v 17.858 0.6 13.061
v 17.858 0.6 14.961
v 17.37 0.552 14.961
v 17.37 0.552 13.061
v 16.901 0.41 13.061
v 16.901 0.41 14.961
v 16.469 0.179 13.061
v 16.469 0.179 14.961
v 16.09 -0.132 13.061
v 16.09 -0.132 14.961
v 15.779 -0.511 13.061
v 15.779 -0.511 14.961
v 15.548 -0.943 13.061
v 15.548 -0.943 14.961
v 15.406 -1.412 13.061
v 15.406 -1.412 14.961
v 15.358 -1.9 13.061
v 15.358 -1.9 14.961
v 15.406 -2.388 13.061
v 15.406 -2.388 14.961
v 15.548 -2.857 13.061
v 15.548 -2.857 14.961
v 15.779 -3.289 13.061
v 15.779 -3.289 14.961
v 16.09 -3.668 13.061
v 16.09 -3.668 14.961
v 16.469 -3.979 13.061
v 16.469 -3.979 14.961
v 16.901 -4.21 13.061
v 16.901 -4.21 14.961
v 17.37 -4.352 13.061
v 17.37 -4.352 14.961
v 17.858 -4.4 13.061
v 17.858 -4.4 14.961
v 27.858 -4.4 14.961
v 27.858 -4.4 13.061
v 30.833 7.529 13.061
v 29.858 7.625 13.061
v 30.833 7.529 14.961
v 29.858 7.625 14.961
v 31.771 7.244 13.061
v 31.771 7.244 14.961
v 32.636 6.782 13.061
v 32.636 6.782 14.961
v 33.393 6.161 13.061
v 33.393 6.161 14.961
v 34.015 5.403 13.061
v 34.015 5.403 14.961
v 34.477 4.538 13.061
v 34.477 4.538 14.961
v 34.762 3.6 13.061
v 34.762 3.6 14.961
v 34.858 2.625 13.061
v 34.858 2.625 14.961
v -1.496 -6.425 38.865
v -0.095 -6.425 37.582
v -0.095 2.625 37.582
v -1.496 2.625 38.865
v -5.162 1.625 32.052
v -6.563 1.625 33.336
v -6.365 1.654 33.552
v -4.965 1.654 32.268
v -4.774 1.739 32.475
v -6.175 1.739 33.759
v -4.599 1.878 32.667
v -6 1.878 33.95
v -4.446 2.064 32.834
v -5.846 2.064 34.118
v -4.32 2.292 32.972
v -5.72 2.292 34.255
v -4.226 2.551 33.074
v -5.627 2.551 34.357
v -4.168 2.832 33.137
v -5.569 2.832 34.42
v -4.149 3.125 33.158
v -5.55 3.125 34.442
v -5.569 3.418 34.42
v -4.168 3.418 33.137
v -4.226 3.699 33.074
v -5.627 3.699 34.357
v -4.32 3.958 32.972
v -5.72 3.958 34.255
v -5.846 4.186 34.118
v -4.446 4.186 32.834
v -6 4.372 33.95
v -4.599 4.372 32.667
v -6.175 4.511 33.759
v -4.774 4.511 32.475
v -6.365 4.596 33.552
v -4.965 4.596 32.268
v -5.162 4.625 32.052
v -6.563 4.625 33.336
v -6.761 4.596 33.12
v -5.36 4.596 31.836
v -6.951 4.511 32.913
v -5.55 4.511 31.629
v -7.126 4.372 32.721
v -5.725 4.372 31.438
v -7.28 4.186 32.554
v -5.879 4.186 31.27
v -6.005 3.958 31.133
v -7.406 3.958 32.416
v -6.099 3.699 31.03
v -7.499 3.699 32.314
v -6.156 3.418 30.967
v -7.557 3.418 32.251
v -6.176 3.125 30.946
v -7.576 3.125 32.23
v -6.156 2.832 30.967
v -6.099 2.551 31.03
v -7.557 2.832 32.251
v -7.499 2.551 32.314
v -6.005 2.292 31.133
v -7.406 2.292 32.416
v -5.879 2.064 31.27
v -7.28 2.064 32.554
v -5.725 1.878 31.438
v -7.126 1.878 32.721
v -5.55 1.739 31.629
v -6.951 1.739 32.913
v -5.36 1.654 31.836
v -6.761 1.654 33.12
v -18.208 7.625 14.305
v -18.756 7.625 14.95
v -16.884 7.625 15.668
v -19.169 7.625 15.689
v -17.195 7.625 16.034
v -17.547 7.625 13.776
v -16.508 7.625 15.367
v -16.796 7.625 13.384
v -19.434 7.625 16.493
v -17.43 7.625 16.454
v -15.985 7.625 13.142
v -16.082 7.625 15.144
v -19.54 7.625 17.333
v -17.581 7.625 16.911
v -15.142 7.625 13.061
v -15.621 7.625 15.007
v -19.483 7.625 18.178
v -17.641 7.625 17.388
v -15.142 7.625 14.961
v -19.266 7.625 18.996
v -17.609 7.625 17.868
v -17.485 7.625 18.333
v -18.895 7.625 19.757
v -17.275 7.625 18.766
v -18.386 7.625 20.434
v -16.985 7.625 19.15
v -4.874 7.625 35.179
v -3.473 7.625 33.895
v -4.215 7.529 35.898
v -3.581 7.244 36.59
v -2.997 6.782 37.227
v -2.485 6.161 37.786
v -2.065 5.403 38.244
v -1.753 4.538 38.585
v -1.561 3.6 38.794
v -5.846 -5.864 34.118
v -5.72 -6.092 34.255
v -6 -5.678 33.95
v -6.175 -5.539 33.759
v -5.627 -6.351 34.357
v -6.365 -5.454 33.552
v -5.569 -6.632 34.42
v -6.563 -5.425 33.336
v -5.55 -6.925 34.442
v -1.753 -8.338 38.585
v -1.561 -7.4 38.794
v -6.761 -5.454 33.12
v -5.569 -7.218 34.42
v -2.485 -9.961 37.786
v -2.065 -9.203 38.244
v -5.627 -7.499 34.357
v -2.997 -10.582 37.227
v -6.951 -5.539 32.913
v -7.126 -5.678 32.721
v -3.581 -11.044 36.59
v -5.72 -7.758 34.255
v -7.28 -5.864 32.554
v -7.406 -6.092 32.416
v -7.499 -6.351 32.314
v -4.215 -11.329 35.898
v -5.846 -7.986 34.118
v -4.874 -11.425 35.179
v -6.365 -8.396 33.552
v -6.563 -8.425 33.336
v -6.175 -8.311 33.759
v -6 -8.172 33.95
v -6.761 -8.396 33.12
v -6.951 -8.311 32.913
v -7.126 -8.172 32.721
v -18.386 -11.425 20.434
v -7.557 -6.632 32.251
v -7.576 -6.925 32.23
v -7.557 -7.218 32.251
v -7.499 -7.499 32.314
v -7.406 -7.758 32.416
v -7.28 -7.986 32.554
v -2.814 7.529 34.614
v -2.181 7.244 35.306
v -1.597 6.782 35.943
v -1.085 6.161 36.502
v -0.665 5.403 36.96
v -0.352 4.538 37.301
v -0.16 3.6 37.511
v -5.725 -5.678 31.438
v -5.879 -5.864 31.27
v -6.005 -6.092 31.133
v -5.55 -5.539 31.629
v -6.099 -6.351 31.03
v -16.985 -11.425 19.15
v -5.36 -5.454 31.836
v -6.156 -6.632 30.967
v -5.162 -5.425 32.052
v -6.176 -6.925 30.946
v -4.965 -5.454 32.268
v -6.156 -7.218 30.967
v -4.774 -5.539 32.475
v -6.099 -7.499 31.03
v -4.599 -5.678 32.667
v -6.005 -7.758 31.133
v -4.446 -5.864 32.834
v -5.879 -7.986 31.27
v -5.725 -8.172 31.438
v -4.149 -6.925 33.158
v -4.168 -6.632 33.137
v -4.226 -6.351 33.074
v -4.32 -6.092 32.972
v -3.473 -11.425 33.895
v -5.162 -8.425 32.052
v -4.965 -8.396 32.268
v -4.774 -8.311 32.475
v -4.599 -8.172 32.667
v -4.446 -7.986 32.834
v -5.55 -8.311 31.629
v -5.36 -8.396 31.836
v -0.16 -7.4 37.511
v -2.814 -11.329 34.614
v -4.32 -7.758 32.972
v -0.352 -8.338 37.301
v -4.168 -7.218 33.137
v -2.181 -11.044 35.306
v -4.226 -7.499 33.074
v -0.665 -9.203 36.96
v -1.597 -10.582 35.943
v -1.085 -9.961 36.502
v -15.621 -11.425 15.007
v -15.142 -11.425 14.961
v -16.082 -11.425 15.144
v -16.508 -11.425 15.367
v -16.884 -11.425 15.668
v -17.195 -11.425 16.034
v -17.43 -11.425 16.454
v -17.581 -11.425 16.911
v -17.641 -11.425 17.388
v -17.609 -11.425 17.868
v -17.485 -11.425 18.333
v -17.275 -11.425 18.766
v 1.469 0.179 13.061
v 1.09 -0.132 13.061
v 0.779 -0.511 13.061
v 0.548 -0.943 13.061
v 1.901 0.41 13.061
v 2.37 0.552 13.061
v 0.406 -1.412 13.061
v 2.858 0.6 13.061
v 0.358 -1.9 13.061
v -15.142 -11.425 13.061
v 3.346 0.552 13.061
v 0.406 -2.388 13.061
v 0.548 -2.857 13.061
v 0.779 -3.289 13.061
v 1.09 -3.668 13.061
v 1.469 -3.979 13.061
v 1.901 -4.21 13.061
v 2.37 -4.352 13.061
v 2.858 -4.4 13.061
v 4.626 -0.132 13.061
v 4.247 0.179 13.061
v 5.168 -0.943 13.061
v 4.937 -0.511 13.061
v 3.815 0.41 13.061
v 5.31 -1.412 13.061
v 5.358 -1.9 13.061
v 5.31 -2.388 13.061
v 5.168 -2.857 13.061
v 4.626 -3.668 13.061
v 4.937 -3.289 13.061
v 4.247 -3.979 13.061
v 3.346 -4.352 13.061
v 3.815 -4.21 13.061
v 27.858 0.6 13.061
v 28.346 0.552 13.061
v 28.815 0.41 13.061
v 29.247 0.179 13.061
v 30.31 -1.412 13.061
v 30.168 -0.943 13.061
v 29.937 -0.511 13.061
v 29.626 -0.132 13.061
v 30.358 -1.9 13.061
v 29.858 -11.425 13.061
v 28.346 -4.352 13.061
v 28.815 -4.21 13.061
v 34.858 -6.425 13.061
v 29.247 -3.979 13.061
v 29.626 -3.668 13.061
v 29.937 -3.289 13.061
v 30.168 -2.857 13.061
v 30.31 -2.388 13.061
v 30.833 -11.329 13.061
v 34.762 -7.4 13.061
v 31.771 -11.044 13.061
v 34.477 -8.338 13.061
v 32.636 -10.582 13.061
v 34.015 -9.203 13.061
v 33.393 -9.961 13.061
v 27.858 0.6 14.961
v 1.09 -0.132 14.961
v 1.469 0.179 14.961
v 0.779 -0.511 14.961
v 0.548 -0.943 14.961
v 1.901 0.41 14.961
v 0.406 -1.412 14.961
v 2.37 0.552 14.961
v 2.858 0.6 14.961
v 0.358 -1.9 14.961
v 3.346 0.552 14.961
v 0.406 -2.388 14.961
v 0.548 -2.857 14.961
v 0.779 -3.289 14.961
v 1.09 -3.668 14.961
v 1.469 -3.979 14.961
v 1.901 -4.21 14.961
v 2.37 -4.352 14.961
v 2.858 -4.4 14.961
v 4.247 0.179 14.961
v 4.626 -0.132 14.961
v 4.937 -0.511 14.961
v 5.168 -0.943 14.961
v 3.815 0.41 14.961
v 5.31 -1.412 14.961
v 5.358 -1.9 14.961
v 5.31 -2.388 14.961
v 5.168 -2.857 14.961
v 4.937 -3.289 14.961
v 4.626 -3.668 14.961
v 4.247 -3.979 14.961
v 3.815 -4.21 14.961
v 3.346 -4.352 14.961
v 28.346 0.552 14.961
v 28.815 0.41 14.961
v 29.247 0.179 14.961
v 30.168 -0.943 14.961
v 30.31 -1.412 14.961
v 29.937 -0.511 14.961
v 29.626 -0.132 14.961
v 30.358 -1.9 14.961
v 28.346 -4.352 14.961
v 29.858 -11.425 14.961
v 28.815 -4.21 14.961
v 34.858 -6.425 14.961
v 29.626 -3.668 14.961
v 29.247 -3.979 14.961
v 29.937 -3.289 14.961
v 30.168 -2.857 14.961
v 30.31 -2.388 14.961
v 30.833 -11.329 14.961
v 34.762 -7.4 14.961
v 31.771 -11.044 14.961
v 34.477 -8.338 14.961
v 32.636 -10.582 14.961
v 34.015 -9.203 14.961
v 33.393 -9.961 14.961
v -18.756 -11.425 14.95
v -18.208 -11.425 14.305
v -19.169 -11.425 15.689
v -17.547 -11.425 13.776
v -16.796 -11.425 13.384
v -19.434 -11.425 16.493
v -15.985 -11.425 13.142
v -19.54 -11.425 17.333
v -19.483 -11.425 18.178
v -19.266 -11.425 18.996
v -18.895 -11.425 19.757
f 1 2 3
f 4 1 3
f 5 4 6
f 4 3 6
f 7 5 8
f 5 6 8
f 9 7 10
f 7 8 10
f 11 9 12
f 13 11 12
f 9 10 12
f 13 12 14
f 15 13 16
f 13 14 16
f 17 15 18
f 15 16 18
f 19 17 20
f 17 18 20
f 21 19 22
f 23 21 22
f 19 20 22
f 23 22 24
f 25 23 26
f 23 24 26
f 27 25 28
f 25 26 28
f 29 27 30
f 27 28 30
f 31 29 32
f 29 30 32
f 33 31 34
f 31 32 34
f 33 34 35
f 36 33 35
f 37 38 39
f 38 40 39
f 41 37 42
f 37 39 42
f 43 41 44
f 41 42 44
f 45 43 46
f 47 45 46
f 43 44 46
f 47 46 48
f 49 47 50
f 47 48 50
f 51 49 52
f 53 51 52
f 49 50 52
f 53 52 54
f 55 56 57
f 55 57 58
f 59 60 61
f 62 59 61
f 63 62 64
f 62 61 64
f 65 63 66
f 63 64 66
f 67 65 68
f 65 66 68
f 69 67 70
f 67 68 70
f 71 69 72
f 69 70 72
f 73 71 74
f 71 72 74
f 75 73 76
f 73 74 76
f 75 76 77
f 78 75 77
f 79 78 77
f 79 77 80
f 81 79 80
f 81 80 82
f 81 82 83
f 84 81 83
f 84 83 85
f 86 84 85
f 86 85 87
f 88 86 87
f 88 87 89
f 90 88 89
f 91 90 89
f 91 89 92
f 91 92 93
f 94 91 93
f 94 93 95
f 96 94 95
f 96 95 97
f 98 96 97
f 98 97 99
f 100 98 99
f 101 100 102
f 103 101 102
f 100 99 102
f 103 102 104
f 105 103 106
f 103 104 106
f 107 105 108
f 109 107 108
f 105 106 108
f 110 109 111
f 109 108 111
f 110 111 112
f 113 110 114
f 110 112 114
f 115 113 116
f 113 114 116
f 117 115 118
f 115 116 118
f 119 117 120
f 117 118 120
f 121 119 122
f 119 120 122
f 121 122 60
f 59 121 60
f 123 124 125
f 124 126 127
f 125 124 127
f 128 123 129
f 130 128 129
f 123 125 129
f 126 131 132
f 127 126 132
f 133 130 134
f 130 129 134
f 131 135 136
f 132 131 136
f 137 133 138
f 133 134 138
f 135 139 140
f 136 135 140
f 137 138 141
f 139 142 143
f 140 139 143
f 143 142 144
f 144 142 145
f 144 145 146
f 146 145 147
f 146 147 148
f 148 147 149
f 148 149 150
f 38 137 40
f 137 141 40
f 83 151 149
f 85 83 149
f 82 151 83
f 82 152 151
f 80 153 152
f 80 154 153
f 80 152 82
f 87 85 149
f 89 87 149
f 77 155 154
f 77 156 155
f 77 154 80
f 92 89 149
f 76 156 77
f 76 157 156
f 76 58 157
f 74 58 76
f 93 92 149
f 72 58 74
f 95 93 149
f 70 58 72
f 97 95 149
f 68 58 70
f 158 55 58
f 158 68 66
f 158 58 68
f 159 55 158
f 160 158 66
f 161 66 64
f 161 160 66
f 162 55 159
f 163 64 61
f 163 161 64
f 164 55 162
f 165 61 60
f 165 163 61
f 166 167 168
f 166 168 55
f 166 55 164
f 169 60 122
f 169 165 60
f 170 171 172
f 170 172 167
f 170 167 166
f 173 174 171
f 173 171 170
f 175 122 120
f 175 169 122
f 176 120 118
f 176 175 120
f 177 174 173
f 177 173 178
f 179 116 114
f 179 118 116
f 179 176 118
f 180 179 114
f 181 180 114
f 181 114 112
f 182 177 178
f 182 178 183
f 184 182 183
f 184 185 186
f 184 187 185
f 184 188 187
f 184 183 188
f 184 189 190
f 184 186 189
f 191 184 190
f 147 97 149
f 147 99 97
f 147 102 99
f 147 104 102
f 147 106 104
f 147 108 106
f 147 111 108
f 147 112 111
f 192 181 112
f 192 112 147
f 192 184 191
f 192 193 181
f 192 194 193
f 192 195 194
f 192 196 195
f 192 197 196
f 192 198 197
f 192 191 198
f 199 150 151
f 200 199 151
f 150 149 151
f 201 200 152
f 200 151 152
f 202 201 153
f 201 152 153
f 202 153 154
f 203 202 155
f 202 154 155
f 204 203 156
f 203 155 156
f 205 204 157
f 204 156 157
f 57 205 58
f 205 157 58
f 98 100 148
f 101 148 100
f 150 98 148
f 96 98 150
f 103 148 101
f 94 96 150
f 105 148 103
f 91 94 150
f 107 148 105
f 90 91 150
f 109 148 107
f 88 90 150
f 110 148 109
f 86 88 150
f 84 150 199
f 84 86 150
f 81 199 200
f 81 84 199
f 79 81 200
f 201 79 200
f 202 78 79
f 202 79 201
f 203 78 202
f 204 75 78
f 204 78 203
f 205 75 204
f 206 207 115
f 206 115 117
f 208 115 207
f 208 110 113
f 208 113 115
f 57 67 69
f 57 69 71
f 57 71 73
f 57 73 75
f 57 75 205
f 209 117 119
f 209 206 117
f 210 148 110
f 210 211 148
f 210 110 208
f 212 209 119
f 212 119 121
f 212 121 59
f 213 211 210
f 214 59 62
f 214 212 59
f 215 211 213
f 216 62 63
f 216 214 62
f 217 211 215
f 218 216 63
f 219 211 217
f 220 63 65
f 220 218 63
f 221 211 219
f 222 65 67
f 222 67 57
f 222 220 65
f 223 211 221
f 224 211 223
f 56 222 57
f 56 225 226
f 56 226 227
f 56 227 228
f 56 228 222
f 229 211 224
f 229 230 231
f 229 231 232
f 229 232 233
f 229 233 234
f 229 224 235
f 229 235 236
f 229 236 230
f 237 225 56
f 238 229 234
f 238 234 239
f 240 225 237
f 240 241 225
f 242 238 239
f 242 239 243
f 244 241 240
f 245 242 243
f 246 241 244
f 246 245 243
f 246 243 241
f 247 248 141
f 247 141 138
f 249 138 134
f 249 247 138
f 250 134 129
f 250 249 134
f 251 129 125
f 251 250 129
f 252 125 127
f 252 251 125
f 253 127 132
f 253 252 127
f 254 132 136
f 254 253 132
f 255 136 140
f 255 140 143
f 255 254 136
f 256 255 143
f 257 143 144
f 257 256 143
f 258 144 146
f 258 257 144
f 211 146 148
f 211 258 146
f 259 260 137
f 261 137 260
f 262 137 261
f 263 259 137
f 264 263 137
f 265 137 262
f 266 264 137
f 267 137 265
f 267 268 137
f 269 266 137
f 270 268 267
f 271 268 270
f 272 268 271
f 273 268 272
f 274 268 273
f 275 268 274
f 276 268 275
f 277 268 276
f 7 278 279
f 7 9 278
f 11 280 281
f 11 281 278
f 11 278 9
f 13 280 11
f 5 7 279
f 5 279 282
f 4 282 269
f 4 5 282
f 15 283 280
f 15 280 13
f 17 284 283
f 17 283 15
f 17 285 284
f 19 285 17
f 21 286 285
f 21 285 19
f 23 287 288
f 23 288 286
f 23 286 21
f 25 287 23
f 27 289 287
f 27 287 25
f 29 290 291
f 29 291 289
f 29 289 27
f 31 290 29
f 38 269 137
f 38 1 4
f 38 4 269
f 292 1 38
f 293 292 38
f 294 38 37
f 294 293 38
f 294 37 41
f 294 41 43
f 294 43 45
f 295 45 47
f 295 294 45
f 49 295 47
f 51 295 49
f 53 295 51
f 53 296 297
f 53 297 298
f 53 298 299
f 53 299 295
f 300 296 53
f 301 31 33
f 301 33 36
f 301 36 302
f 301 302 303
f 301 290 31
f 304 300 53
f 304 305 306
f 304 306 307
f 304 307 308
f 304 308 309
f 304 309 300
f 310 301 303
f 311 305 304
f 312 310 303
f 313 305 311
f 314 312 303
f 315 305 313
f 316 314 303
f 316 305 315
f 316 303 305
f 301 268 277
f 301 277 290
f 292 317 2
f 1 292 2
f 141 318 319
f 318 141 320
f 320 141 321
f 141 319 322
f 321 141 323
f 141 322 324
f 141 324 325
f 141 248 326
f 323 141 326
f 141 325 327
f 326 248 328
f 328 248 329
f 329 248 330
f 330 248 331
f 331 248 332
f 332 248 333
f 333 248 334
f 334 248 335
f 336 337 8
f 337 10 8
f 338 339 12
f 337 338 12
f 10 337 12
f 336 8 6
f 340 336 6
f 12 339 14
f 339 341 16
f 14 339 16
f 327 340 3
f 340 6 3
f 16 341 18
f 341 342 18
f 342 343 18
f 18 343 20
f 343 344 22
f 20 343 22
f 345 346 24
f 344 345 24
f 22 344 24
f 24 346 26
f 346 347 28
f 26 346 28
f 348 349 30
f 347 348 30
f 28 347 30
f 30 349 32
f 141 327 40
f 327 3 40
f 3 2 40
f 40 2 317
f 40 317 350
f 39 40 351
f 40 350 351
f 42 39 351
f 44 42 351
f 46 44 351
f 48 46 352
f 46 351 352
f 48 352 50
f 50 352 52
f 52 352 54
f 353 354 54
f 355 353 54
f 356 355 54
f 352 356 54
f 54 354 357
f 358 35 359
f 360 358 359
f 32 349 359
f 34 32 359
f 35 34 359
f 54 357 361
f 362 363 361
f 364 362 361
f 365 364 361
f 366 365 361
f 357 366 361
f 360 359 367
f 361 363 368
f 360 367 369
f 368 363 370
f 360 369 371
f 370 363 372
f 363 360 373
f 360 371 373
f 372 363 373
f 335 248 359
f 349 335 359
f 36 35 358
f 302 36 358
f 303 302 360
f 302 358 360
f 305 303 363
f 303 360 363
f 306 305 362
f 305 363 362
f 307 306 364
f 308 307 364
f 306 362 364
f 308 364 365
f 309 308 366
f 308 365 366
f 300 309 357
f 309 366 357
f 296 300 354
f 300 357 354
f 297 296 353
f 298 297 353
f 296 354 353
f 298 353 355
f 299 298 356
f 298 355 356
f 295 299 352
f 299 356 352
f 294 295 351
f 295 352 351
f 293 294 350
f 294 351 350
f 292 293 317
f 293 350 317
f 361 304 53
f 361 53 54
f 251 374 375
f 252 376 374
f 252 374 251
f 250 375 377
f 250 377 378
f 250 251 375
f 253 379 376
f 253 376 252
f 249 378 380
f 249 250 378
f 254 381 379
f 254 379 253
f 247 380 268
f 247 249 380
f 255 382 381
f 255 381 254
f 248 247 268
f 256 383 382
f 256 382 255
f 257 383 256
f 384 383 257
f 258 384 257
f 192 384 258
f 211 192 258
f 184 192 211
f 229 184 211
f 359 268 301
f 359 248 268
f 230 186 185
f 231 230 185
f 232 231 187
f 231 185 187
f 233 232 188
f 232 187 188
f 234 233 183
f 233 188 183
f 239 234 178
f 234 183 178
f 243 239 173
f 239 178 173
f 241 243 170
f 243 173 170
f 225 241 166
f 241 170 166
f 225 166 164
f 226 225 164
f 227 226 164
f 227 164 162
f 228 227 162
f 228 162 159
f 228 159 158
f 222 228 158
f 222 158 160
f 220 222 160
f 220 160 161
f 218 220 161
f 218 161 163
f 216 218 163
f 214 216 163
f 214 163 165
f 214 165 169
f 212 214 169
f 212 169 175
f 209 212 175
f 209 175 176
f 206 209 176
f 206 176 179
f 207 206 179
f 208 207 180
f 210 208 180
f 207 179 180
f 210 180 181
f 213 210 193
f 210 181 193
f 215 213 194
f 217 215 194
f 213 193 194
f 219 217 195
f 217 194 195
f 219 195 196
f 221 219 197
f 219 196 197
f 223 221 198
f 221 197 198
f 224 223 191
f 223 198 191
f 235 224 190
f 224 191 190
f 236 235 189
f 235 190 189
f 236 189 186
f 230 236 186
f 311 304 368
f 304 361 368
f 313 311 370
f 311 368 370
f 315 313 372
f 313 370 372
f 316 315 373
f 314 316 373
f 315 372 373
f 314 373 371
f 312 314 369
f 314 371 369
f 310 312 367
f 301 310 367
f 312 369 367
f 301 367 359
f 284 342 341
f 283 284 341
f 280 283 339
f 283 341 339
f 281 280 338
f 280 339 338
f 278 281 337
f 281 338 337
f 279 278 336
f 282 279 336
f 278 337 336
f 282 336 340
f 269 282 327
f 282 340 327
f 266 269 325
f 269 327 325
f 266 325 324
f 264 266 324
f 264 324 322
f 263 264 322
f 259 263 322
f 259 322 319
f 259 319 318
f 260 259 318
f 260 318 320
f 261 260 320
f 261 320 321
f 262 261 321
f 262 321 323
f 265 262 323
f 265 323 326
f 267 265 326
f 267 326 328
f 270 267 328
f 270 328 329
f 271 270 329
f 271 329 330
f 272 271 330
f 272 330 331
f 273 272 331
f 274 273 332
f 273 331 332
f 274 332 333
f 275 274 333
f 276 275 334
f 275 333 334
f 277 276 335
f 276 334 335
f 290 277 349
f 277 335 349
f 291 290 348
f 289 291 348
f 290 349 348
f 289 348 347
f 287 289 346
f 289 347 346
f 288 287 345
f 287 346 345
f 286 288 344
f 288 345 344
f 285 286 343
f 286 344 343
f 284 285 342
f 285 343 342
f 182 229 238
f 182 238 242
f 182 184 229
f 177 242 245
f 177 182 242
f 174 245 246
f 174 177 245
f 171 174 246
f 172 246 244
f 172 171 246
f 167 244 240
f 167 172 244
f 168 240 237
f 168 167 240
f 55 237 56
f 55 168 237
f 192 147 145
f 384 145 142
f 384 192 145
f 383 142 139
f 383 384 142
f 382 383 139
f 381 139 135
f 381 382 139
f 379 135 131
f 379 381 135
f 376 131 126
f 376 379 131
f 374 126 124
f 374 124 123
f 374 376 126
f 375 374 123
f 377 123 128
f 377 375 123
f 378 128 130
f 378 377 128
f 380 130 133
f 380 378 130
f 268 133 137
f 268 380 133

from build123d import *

# Parameters (mm, degrees)
F0_W     = 50
F0_H     = 1.9
F1_DEPTH = 1.9
F2_DEPTH = 9.525
F3_R     = 2.5
F4_DEPTH = 1.901
F5_R     = 1.5
F6_DEPTH = 25
F7_R     = 5


with BuildPart() as f1:
    # F0 (on Front) → F1 (new body)
    with BuildSketch(Plane.XZ):
        with Locations((9.8579123784, 14.0109292623)):
            Rectangle(F0_W, F0_H)
        with BuildLine():
            ThreePointArc((-18.3860669017, 20.4335709209), (-19.169470351, 15.6888716021), (-15.1420876216, 13.0609292623))
            Line((-15.1420876216, 13.0609292623), (-15.1420876216, 14.9609292623))
            ThreePointArc((-15.1420876216, 14.9609292623), (-17.4303732633, 16.454078319), (-16.9852576671, 19.1499302047))
            Line((-16.9852576671, 19.1499302047), (-18.3860669017, 20.4335709209))
        make_face()
        Polygon((-1.496057478, 38.865271376), (-18.3860669017, 20.4335709209), (-16.9852576671, 19.1499302047), (-0.0952482434, 37.5816306598), align=None)
    extrude(amount=F1_DEPTH)

    # F2 (add, symmetric): a face of the model
    f2_faces = [f1.faces().sort_by_distance(p)[0] for p in [
        (34.2558140416, -1.9, 14.0109292623),
    ]]
    extrude(f2_faces, amount=F2_DEPTH, both=True)

    # F3 (on face) → F4 (cut, through all)
    with BuildSketch(Plane.XY.offset(14.9609292623)):
        with BuildLine():
            Line((27.8579123784, 0.6), (17.8579123784, 0.6))
            ThreePointArc((17.8579123784, 0.6), (15.3579123784, -1.9), (17.8579123784, -4.4))
            Line((17.8579123784, -4.4), (27.8579123784, -4.4))
            ThreePointArc((27.8579123784, -4.4), (30.3579123784, -1.9), (27.8579123784, 0.6))
        make_face()
        with Locations((2.8579123784, -1.9)):
            Circle(F3_R)
    extrude(amount=-F4_DEPTH, mode=Mode.SUBTRACT)

    # F5 (on face) → F6 (cut)
    with BuildSketch(Plane(origin=(-20.1719385395, 0, 18.4846879894), x_dir=(0, -1, 0), z_dir=(-0.7372680182, 0, 0.6756003769))):
        with Locations((6.925, 20.1433846083)):
            Circle(F5_R)
        with Locations((-3.125, 20.1433846083)):
            Circle(F5_R)
    extrude(amount=-F6_DEPTH, mode=Mode.SUBTRACT)

    # F7
    f7_edges = [f1.edges().sort_by_distance(p)[0] for p in [
        (-0.795653, -11.425, 38.223451),
        (-0.795653, 7.625, 38.223451),
        (34.857912, 7.625, 14.010929),
        (34.857912, -11.425, 14.010929),
    ]]
    fillet(f7_edges, radius=F7_R)


solid = f1.part
